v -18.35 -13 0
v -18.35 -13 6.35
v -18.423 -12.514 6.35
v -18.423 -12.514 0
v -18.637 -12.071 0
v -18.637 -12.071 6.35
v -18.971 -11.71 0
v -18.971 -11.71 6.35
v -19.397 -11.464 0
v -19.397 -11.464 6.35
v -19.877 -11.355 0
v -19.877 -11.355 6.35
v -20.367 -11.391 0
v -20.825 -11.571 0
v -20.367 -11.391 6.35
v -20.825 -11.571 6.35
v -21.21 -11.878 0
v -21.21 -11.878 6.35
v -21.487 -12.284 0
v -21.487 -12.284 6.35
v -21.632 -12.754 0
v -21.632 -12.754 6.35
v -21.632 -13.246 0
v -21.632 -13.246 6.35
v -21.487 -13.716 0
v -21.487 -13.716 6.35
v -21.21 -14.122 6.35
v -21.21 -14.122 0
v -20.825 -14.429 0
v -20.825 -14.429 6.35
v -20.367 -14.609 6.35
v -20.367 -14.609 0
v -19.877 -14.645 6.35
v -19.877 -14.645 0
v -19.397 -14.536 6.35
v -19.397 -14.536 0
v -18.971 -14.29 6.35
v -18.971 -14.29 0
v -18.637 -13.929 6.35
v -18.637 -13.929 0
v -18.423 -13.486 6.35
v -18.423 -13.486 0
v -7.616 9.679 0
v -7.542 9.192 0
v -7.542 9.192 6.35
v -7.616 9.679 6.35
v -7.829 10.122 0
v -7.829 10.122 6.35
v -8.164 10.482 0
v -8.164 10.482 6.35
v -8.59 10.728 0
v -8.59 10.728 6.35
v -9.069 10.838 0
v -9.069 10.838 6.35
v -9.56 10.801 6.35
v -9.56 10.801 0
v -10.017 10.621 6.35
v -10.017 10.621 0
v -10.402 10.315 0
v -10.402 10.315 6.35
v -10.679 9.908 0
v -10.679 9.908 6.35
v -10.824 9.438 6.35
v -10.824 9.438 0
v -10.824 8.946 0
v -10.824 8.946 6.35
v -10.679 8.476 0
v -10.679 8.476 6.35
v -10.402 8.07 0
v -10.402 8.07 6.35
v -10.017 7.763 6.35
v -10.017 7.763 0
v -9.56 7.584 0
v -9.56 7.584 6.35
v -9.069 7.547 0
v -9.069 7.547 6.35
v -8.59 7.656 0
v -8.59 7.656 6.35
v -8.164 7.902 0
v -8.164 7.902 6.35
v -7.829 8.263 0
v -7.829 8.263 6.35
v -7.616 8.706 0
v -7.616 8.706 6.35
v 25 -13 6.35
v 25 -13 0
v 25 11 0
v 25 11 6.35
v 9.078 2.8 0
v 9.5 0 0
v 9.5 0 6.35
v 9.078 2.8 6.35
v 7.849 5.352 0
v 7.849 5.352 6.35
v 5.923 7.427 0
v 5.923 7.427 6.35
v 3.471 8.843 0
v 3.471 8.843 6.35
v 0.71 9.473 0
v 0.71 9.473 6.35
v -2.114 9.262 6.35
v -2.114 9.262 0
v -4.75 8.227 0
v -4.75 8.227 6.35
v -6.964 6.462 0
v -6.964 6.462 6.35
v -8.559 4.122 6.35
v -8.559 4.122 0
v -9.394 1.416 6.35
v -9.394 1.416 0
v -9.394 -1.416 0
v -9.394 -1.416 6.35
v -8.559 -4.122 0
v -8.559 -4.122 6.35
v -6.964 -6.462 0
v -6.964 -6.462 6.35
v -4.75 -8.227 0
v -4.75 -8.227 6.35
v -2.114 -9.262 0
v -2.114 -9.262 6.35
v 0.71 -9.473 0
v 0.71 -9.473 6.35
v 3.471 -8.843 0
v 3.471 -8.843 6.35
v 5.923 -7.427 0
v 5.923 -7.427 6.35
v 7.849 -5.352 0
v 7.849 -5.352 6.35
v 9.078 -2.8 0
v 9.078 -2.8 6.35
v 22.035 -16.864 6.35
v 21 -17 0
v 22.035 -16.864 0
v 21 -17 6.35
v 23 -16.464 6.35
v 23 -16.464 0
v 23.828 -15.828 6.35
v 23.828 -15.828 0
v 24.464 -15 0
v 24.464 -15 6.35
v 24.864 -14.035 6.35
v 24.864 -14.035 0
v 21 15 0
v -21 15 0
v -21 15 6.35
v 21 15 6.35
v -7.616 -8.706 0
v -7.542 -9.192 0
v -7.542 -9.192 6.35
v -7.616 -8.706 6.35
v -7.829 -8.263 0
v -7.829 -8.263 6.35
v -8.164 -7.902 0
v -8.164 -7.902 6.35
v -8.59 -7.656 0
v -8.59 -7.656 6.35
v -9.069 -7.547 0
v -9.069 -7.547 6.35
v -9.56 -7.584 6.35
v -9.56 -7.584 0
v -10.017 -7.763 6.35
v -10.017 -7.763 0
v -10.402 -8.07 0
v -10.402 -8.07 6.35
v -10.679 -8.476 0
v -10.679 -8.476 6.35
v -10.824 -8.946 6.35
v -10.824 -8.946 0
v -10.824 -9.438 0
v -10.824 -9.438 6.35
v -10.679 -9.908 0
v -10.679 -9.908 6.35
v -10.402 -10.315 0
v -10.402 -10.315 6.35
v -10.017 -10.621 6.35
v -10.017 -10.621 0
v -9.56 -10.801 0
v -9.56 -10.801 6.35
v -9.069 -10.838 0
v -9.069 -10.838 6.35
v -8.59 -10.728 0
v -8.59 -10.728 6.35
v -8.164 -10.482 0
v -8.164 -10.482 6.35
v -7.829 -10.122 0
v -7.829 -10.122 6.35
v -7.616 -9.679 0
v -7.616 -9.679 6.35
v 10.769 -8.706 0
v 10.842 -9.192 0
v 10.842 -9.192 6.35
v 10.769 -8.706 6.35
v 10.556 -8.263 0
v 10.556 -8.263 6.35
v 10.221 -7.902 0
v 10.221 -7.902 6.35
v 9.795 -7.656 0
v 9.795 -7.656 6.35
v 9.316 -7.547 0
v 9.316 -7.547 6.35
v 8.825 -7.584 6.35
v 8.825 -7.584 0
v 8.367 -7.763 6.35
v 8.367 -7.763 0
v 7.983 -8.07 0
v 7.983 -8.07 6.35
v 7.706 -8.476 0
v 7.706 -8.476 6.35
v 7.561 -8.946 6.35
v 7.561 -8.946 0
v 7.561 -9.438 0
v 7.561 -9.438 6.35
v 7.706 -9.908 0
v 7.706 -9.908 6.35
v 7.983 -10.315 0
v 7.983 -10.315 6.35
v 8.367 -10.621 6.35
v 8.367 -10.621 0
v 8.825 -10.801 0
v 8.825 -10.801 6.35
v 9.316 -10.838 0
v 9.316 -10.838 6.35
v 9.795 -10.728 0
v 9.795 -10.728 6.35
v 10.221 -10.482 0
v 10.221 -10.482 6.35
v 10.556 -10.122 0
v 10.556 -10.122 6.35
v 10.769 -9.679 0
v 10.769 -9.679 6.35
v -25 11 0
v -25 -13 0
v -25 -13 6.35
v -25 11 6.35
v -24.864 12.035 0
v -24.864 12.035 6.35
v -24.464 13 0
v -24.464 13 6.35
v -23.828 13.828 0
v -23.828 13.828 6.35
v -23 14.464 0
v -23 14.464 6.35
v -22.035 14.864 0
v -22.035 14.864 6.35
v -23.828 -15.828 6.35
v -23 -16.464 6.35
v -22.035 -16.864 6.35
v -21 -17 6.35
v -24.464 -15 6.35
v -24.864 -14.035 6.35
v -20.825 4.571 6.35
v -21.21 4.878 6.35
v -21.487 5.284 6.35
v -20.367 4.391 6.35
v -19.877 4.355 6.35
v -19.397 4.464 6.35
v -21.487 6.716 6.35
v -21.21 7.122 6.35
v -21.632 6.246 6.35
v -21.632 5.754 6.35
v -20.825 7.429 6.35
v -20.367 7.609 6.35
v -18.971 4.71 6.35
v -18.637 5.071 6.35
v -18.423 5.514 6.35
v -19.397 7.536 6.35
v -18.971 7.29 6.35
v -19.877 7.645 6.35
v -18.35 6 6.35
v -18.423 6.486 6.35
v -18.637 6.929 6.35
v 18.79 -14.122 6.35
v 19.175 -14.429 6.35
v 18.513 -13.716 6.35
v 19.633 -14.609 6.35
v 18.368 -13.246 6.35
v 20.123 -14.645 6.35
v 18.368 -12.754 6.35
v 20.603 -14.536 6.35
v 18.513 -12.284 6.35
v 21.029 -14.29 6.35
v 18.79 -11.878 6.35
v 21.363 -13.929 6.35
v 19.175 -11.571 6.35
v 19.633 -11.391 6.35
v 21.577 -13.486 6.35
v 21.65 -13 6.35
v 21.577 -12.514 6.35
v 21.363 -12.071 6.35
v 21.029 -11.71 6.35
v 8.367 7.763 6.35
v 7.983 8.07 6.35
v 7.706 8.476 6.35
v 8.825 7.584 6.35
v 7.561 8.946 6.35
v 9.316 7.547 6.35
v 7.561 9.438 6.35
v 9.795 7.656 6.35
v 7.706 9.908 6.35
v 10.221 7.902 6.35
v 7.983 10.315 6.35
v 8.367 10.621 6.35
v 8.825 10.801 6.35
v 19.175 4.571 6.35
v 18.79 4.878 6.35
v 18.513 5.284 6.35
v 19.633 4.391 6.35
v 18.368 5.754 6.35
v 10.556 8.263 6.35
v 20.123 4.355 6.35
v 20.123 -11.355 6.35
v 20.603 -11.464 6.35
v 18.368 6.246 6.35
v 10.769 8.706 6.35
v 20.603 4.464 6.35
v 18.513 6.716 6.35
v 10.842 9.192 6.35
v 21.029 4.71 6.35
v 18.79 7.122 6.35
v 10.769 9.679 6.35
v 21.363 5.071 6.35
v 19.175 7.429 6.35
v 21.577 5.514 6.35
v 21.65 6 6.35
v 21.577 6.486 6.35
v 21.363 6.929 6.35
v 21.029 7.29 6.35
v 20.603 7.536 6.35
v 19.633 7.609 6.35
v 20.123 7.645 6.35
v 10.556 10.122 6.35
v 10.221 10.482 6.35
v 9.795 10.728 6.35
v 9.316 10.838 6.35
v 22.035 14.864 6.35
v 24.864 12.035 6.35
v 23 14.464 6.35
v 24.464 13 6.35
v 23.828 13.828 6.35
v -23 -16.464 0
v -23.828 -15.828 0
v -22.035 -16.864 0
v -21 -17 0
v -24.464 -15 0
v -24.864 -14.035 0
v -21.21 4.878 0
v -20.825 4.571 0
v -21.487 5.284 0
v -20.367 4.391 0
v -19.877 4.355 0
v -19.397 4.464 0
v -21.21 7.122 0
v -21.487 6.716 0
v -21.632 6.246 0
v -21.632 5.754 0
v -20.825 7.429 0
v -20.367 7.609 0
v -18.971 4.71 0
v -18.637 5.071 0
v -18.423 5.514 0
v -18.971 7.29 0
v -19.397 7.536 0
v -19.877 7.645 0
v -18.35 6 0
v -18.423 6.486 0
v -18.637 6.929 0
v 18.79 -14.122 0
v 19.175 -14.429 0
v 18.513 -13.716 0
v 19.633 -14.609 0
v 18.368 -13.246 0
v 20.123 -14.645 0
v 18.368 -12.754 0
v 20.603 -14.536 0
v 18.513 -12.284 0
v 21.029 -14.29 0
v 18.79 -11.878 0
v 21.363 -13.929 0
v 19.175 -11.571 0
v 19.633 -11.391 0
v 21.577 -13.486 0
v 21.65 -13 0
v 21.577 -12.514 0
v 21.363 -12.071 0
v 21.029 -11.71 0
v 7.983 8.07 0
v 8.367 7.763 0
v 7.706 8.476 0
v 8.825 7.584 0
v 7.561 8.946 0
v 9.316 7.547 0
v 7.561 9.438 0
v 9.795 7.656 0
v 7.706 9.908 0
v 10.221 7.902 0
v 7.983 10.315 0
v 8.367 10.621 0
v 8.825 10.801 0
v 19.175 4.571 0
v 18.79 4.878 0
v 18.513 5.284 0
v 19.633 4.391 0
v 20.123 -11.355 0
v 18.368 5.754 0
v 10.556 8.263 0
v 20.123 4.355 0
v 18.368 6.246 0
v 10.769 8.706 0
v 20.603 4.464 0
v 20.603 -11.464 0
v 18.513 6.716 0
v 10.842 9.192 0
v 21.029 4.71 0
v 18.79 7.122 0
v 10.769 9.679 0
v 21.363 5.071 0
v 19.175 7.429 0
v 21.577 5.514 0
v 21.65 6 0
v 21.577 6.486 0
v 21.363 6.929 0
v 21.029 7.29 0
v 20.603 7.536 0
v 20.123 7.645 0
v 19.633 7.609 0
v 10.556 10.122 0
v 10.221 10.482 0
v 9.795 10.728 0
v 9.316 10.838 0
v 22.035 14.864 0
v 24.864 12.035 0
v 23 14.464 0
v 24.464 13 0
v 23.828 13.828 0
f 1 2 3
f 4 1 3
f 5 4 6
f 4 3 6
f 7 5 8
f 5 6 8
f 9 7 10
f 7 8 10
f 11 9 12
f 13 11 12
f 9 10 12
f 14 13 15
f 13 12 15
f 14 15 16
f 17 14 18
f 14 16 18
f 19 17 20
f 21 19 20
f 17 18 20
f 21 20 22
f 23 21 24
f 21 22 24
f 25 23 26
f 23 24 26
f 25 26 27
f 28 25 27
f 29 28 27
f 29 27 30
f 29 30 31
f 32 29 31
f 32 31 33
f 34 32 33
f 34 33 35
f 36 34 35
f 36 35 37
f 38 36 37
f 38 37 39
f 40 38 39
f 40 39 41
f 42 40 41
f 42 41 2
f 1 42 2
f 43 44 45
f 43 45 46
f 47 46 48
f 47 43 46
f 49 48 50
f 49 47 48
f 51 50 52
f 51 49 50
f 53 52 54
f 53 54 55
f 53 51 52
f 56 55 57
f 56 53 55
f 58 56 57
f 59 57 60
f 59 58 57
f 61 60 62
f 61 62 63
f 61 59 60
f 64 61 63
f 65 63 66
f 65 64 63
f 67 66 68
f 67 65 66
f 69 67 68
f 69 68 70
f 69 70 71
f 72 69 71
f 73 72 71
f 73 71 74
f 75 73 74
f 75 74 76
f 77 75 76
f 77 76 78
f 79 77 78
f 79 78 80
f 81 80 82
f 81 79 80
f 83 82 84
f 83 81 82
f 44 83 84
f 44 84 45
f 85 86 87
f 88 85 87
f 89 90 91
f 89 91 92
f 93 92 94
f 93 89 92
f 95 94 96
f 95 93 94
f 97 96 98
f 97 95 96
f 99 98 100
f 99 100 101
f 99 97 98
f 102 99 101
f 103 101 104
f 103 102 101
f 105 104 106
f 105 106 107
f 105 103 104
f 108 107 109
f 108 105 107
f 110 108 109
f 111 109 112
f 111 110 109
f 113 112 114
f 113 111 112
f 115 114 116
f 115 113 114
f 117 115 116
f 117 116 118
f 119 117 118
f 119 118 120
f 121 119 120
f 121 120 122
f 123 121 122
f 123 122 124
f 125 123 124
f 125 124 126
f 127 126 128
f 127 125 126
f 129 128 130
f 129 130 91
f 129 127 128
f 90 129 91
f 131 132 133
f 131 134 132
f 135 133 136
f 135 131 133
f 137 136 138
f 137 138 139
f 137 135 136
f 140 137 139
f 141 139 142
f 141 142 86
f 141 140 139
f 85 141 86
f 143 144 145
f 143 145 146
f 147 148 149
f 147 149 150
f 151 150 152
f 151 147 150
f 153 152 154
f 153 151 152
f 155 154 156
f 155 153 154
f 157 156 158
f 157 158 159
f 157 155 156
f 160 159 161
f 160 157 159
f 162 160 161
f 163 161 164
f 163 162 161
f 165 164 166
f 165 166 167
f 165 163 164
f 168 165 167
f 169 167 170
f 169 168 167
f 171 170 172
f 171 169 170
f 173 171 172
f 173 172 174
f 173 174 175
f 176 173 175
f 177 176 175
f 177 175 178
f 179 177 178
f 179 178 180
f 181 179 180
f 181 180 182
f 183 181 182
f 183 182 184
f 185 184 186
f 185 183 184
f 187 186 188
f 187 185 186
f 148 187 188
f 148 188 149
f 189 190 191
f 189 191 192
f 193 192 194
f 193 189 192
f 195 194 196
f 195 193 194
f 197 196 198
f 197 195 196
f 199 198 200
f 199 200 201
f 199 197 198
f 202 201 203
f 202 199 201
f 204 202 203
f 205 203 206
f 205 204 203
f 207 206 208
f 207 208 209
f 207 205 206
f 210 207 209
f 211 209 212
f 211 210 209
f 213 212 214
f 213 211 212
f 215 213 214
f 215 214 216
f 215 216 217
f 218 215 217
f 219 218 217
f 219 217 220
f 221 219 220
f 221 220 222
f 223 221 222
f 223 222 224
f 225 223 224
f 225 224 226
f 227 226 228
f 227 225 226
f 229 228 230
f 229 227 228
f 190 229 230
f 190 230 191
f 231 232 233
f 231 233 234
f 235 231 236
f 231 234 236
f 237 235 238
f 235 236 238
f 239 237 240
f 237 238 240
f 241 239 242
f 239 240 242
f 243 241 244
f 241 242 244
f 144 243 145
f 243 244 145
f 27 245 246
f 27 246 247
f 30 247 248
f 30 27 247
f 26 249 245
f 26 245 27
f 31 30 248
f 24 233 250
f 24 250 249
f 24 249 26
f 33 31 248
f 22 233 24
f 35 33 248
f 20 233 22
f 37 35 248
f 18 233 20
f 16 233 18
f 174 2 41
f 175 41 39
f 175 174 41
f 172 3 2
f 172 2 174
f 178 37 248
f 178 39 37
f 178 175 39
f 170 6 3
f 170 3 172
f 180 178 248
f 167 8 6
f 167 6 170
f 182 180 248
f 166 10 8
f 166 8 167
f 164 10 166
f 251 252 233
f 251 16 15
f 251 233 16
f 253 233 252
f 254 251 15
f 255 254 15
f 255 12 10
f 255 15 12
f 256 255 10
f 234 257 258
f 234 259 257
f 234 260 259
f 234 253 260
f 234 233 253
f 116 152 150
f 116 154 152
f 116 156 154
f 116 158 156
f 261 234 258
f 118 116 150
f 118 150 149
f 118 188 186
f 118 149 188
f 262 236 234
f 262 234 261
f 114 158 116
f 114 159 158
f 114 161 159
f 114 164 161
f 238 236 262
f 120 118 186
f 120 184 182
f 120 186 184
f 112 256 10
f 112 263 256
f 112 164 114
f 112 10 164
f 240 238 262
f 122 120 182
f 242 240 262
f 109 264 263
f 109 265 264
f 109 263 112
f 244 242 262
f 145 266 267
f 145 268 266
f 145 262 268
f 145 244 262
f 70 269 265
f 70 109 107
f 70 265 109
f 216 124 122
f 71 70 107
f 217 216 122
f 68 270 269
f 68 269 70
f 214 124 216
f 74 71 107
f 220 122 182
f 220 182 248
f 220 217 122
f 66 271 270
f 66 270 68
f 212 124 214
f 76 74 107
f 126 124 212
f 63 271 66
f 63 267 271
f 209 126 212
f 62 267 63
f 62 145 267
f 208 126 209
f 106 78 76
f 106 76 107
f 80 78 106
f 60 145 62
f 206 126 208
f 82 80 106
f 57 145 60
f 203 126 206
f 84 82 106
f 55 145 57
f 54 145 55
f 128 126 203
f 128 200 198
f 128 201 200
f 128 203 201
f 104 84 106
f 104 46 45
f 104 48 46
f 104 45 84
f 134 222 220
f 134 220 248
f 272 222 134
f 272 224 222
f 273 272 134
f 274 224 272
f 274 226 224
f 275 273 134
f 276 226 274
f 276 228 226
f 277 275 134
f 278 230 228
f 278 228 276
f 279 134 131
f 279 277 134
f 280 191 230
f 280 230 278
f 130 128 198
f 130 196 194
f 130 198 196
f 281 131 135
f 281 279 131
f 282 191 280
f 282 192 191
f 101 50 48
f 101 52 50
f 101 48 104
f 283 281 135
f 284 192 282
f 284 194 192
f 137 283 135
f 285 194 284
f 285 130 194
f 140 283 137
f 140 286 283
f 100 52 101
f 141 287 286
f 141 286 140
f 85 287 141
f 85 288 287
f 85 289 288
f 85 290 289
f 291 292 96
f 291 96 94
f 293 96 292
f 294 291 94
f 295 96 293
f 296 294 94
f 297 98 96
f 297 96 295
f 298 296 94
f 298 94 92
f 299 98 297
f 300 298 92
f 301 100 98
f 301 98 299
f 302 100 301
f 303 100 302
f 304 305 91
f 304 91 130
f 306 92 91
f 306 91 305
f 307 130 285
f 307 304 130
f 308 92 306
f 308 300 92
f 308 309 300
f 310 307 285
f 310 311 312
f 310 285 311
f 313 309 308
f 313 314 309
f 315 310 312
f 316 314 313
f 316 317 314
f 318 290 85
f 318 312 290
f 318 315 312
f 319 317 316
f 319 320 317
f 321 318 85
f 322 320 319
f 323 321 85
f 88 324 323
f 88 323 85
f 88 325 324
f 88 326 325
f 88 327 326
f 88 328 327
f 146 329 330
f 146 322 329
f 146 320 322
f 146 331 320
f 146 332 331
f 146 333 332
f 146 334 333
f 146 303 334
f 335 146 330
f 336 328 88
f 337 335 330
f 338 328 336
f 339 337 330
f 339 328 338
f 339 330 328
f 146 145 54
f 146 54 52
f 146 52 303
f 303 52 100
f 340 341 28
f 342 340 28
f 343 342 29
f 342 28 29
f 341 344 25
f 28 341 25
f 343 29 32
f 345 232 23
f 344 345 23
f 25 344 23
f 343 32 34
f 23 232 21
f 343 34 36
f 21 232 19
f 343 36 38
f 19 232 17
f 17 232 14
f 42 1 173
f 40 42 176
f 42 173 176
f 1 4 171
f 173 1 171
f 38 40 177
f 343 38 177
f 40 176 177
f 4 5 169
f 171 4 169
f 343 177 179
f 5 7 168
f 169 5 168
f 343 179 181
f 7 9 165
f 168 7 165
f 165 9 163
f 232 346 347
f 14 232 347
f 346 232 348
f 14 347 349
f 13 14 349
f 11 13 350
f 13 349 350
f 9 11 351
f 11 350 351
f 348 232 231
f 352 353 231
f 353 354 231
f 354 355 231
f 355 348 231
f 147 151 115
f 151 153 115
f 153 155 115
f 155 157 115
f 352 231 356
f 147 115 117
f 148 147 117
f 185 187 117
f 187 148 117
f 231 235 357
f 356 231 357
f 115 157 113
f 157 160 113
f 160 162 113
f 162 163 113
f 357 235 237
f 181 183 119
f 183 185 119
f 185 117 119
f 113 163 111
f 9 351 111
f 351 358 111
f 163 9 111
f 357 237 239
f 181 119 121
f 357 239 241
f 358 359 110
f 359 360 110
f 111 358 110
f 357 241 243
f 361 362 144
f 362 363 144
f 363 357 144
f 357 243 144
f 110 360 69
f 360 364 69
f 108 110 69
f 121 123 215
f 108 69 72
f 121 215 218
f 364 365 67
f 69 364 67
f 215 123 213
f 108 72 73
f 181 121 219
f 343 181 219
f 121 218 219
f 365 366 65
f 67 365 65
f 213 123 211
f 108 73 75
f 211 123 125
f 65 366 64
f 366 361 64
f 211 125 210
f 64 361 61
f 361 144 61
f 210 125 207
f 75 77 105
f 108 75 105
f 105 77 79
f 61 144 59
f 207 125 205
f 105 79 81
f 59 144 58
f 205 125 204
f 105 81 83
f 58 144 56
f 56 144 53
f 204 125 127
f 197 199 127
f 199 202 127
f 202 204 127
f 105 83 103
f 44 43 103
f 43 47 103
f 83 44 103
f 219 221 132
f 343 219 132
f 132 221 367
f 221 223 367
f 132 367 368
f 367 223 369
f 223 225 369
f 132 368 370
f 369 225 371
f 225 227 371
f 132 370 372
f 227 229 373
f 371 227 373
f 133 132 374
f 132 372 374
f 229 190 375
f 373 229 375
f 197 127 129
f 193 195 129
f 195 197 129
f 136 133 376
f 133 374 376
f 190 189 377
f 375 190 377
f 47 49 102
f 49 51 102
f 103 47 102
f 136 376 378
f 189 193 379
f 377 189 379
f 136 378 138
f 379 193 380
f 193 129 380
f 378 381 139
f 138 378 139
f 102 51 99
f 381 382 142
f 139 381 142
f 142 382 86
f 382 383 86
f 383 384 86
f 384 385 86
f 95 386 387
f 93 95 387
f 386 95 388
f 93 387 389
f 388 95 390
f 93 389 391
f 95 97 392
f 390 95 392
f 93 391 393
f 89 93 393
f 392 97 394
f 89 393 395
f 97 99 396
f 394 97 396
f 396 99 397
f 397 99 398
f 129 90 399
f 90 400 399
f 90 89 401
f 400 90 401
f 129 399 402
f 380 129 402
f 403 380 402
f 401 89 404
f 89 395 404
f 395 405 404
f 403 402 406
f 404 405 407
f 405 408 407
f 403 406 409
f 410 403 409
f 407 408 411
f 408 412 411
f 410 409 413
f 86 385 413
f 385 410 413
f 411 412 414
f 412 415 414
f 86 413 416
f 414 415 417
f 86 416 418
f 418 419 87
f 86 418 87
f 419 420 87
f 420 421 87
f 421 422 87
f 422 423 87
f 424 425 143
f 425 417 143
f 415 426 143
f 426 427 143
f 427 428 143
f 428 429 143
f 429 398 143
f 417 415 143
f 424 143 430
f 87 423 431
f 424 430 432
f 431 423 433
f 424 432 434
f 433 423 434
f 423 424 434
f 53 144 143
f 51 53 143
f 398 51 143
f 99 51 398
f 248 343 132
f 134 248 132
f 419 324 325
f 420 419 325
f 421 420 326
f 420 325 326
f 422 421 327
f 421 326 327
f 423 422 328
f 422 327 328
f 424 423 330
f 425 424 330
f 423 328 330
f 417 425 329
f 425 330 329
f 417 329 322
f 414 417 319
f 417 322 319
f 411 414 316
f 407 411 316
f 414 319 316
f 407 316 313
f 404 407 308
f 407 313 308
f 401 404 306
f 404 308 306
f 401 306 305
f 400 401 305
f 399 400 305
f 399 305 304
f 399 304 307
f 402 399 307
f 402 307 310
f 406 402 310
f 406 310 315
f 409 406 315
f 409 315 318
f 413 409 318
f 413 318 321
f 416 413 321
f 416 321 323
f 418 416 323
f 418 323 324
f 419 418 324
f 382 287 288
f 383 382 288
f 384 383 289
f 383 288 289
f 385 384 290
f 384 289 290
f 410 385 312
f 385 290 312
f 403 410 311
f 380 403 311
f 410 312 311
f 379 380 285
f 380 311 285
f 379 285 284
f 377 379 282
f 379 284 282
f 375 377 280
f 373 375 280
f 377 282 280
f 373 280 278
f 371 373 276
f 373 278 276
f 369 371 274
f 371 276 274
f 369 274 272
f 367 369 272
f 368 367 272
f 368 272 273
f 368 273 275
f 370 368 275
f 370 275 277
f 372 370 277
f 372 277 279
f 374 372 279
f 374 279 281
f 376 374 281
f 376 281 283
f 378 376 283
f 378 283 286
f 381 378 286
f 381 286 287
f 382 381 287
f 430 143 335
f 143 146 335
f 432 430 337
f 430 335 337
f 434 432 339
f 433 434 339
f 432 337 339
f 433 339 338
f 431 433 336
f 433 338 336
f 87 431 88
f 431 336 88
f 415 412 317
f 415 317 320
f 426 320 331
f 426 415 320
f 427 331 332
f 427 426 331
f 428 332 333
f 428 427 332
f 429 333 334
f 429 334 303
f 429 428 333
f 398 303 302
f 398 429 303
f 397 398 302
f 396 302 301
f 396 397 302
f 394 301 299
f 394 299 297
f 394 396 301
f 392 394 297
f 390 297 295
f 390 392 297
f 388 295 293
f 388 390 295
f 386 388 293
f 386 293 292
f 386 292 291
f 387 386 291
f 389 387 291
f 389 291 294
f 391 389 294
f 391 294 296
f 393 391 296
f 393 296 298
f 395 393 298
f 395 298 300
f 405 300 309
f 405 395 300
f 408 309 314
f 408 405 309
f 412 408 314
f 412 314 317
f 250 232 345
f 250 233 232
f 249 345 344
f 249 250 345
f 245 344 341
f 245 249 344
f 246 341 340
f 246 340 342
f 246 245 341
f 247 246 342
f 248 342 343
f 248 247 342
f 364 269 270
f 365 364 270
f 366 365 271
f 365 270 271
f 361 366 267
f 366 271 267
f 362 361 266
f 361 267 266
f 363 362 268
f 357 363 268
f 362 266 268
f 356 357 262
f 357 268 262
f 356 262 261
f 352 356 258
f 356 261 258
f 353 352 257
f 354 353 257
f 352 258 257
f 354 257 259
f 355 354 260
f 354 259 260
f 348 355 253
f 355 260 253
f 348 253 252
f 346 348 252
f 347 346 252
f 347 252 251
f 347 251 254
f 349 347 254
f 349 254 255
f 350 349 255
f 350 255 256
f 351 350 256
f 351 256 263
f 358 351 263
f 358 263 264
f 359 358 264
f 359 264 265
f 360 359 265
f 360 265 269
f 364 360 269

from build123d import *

# Parameters (mm, degrees)
SKETCH1_W           = 50
SKETCH1_H           = 32
SKETCH1_R           = 9.5
SKETCH1_R_2         = 1.65
BOSS_EXTRUDE1_DEPTH = 6.35
SKETCH2_R           = 1.65
CUT_EXTRUDE1_DEPTH  = 31.892110643
FILLET1_R           = 4


with BuildPart() as part:
    # Sketch1 → Boss-Extrude1 (new body)
    with BuildSketch(Plane.XY):
        with Locations((0, -1)):
            Rectangle(SKETCH1_W, SKETCH1_H)
        Circle(SKETCH1_R, mode=Mode.SUBTRACT)
        with Locations((-9.192388155, 9.192388155)):
            Circle(SKETCH1_R_2, mode=Mode.SUBTRACT)
        with Locations((9.192388155, 9.192388155)):
            Circle(SKETCH1_R_2, mode=Mode.SUBTRACT)
        with Locations((9.192388155, -9.192388155)):
            Circle(SKETCH1_R_2, mode=Mode.SUBTRACT)
        with Locations((-9.192388155, -9.192388155)):
            Circle(SKETCH1_R_2, mode=Mode.SUBTRACT)
    extrude(amount=BOSS_EXTRUDE1_DEPTH)

    # Sketch2 → Cut-Extrude1 (cut, through all)
    with BuildSketch(Plane.XY.offset(6.35)):
        with Locations((-20, 6)):
            Circle(SKETCH2_R)
        with Locations((-20, -13)):
            Circle(SKETCH2_R)
        with Locations((20, -13)):
            Circle(SKETCH2_R)
        with Locations((20, 6)):
            Circle(SKETCH2_R)
    extrude(amount=-CUT_EXTRUDE1_DEPTH, mode=Mode.SUBTRACT)

    # Fillet1
    fillet1_edges = [part.edges().sort_by_distance(p)[0] for p in [
        (-25, 15, 3.175),
        (25, 15, 3.175),
        (25, -17, 3.175),
        (-25, -17, 3.175),
    ]]
    fillet(fillet1_edges, radius=FILLET1_R)


solid = part.part
